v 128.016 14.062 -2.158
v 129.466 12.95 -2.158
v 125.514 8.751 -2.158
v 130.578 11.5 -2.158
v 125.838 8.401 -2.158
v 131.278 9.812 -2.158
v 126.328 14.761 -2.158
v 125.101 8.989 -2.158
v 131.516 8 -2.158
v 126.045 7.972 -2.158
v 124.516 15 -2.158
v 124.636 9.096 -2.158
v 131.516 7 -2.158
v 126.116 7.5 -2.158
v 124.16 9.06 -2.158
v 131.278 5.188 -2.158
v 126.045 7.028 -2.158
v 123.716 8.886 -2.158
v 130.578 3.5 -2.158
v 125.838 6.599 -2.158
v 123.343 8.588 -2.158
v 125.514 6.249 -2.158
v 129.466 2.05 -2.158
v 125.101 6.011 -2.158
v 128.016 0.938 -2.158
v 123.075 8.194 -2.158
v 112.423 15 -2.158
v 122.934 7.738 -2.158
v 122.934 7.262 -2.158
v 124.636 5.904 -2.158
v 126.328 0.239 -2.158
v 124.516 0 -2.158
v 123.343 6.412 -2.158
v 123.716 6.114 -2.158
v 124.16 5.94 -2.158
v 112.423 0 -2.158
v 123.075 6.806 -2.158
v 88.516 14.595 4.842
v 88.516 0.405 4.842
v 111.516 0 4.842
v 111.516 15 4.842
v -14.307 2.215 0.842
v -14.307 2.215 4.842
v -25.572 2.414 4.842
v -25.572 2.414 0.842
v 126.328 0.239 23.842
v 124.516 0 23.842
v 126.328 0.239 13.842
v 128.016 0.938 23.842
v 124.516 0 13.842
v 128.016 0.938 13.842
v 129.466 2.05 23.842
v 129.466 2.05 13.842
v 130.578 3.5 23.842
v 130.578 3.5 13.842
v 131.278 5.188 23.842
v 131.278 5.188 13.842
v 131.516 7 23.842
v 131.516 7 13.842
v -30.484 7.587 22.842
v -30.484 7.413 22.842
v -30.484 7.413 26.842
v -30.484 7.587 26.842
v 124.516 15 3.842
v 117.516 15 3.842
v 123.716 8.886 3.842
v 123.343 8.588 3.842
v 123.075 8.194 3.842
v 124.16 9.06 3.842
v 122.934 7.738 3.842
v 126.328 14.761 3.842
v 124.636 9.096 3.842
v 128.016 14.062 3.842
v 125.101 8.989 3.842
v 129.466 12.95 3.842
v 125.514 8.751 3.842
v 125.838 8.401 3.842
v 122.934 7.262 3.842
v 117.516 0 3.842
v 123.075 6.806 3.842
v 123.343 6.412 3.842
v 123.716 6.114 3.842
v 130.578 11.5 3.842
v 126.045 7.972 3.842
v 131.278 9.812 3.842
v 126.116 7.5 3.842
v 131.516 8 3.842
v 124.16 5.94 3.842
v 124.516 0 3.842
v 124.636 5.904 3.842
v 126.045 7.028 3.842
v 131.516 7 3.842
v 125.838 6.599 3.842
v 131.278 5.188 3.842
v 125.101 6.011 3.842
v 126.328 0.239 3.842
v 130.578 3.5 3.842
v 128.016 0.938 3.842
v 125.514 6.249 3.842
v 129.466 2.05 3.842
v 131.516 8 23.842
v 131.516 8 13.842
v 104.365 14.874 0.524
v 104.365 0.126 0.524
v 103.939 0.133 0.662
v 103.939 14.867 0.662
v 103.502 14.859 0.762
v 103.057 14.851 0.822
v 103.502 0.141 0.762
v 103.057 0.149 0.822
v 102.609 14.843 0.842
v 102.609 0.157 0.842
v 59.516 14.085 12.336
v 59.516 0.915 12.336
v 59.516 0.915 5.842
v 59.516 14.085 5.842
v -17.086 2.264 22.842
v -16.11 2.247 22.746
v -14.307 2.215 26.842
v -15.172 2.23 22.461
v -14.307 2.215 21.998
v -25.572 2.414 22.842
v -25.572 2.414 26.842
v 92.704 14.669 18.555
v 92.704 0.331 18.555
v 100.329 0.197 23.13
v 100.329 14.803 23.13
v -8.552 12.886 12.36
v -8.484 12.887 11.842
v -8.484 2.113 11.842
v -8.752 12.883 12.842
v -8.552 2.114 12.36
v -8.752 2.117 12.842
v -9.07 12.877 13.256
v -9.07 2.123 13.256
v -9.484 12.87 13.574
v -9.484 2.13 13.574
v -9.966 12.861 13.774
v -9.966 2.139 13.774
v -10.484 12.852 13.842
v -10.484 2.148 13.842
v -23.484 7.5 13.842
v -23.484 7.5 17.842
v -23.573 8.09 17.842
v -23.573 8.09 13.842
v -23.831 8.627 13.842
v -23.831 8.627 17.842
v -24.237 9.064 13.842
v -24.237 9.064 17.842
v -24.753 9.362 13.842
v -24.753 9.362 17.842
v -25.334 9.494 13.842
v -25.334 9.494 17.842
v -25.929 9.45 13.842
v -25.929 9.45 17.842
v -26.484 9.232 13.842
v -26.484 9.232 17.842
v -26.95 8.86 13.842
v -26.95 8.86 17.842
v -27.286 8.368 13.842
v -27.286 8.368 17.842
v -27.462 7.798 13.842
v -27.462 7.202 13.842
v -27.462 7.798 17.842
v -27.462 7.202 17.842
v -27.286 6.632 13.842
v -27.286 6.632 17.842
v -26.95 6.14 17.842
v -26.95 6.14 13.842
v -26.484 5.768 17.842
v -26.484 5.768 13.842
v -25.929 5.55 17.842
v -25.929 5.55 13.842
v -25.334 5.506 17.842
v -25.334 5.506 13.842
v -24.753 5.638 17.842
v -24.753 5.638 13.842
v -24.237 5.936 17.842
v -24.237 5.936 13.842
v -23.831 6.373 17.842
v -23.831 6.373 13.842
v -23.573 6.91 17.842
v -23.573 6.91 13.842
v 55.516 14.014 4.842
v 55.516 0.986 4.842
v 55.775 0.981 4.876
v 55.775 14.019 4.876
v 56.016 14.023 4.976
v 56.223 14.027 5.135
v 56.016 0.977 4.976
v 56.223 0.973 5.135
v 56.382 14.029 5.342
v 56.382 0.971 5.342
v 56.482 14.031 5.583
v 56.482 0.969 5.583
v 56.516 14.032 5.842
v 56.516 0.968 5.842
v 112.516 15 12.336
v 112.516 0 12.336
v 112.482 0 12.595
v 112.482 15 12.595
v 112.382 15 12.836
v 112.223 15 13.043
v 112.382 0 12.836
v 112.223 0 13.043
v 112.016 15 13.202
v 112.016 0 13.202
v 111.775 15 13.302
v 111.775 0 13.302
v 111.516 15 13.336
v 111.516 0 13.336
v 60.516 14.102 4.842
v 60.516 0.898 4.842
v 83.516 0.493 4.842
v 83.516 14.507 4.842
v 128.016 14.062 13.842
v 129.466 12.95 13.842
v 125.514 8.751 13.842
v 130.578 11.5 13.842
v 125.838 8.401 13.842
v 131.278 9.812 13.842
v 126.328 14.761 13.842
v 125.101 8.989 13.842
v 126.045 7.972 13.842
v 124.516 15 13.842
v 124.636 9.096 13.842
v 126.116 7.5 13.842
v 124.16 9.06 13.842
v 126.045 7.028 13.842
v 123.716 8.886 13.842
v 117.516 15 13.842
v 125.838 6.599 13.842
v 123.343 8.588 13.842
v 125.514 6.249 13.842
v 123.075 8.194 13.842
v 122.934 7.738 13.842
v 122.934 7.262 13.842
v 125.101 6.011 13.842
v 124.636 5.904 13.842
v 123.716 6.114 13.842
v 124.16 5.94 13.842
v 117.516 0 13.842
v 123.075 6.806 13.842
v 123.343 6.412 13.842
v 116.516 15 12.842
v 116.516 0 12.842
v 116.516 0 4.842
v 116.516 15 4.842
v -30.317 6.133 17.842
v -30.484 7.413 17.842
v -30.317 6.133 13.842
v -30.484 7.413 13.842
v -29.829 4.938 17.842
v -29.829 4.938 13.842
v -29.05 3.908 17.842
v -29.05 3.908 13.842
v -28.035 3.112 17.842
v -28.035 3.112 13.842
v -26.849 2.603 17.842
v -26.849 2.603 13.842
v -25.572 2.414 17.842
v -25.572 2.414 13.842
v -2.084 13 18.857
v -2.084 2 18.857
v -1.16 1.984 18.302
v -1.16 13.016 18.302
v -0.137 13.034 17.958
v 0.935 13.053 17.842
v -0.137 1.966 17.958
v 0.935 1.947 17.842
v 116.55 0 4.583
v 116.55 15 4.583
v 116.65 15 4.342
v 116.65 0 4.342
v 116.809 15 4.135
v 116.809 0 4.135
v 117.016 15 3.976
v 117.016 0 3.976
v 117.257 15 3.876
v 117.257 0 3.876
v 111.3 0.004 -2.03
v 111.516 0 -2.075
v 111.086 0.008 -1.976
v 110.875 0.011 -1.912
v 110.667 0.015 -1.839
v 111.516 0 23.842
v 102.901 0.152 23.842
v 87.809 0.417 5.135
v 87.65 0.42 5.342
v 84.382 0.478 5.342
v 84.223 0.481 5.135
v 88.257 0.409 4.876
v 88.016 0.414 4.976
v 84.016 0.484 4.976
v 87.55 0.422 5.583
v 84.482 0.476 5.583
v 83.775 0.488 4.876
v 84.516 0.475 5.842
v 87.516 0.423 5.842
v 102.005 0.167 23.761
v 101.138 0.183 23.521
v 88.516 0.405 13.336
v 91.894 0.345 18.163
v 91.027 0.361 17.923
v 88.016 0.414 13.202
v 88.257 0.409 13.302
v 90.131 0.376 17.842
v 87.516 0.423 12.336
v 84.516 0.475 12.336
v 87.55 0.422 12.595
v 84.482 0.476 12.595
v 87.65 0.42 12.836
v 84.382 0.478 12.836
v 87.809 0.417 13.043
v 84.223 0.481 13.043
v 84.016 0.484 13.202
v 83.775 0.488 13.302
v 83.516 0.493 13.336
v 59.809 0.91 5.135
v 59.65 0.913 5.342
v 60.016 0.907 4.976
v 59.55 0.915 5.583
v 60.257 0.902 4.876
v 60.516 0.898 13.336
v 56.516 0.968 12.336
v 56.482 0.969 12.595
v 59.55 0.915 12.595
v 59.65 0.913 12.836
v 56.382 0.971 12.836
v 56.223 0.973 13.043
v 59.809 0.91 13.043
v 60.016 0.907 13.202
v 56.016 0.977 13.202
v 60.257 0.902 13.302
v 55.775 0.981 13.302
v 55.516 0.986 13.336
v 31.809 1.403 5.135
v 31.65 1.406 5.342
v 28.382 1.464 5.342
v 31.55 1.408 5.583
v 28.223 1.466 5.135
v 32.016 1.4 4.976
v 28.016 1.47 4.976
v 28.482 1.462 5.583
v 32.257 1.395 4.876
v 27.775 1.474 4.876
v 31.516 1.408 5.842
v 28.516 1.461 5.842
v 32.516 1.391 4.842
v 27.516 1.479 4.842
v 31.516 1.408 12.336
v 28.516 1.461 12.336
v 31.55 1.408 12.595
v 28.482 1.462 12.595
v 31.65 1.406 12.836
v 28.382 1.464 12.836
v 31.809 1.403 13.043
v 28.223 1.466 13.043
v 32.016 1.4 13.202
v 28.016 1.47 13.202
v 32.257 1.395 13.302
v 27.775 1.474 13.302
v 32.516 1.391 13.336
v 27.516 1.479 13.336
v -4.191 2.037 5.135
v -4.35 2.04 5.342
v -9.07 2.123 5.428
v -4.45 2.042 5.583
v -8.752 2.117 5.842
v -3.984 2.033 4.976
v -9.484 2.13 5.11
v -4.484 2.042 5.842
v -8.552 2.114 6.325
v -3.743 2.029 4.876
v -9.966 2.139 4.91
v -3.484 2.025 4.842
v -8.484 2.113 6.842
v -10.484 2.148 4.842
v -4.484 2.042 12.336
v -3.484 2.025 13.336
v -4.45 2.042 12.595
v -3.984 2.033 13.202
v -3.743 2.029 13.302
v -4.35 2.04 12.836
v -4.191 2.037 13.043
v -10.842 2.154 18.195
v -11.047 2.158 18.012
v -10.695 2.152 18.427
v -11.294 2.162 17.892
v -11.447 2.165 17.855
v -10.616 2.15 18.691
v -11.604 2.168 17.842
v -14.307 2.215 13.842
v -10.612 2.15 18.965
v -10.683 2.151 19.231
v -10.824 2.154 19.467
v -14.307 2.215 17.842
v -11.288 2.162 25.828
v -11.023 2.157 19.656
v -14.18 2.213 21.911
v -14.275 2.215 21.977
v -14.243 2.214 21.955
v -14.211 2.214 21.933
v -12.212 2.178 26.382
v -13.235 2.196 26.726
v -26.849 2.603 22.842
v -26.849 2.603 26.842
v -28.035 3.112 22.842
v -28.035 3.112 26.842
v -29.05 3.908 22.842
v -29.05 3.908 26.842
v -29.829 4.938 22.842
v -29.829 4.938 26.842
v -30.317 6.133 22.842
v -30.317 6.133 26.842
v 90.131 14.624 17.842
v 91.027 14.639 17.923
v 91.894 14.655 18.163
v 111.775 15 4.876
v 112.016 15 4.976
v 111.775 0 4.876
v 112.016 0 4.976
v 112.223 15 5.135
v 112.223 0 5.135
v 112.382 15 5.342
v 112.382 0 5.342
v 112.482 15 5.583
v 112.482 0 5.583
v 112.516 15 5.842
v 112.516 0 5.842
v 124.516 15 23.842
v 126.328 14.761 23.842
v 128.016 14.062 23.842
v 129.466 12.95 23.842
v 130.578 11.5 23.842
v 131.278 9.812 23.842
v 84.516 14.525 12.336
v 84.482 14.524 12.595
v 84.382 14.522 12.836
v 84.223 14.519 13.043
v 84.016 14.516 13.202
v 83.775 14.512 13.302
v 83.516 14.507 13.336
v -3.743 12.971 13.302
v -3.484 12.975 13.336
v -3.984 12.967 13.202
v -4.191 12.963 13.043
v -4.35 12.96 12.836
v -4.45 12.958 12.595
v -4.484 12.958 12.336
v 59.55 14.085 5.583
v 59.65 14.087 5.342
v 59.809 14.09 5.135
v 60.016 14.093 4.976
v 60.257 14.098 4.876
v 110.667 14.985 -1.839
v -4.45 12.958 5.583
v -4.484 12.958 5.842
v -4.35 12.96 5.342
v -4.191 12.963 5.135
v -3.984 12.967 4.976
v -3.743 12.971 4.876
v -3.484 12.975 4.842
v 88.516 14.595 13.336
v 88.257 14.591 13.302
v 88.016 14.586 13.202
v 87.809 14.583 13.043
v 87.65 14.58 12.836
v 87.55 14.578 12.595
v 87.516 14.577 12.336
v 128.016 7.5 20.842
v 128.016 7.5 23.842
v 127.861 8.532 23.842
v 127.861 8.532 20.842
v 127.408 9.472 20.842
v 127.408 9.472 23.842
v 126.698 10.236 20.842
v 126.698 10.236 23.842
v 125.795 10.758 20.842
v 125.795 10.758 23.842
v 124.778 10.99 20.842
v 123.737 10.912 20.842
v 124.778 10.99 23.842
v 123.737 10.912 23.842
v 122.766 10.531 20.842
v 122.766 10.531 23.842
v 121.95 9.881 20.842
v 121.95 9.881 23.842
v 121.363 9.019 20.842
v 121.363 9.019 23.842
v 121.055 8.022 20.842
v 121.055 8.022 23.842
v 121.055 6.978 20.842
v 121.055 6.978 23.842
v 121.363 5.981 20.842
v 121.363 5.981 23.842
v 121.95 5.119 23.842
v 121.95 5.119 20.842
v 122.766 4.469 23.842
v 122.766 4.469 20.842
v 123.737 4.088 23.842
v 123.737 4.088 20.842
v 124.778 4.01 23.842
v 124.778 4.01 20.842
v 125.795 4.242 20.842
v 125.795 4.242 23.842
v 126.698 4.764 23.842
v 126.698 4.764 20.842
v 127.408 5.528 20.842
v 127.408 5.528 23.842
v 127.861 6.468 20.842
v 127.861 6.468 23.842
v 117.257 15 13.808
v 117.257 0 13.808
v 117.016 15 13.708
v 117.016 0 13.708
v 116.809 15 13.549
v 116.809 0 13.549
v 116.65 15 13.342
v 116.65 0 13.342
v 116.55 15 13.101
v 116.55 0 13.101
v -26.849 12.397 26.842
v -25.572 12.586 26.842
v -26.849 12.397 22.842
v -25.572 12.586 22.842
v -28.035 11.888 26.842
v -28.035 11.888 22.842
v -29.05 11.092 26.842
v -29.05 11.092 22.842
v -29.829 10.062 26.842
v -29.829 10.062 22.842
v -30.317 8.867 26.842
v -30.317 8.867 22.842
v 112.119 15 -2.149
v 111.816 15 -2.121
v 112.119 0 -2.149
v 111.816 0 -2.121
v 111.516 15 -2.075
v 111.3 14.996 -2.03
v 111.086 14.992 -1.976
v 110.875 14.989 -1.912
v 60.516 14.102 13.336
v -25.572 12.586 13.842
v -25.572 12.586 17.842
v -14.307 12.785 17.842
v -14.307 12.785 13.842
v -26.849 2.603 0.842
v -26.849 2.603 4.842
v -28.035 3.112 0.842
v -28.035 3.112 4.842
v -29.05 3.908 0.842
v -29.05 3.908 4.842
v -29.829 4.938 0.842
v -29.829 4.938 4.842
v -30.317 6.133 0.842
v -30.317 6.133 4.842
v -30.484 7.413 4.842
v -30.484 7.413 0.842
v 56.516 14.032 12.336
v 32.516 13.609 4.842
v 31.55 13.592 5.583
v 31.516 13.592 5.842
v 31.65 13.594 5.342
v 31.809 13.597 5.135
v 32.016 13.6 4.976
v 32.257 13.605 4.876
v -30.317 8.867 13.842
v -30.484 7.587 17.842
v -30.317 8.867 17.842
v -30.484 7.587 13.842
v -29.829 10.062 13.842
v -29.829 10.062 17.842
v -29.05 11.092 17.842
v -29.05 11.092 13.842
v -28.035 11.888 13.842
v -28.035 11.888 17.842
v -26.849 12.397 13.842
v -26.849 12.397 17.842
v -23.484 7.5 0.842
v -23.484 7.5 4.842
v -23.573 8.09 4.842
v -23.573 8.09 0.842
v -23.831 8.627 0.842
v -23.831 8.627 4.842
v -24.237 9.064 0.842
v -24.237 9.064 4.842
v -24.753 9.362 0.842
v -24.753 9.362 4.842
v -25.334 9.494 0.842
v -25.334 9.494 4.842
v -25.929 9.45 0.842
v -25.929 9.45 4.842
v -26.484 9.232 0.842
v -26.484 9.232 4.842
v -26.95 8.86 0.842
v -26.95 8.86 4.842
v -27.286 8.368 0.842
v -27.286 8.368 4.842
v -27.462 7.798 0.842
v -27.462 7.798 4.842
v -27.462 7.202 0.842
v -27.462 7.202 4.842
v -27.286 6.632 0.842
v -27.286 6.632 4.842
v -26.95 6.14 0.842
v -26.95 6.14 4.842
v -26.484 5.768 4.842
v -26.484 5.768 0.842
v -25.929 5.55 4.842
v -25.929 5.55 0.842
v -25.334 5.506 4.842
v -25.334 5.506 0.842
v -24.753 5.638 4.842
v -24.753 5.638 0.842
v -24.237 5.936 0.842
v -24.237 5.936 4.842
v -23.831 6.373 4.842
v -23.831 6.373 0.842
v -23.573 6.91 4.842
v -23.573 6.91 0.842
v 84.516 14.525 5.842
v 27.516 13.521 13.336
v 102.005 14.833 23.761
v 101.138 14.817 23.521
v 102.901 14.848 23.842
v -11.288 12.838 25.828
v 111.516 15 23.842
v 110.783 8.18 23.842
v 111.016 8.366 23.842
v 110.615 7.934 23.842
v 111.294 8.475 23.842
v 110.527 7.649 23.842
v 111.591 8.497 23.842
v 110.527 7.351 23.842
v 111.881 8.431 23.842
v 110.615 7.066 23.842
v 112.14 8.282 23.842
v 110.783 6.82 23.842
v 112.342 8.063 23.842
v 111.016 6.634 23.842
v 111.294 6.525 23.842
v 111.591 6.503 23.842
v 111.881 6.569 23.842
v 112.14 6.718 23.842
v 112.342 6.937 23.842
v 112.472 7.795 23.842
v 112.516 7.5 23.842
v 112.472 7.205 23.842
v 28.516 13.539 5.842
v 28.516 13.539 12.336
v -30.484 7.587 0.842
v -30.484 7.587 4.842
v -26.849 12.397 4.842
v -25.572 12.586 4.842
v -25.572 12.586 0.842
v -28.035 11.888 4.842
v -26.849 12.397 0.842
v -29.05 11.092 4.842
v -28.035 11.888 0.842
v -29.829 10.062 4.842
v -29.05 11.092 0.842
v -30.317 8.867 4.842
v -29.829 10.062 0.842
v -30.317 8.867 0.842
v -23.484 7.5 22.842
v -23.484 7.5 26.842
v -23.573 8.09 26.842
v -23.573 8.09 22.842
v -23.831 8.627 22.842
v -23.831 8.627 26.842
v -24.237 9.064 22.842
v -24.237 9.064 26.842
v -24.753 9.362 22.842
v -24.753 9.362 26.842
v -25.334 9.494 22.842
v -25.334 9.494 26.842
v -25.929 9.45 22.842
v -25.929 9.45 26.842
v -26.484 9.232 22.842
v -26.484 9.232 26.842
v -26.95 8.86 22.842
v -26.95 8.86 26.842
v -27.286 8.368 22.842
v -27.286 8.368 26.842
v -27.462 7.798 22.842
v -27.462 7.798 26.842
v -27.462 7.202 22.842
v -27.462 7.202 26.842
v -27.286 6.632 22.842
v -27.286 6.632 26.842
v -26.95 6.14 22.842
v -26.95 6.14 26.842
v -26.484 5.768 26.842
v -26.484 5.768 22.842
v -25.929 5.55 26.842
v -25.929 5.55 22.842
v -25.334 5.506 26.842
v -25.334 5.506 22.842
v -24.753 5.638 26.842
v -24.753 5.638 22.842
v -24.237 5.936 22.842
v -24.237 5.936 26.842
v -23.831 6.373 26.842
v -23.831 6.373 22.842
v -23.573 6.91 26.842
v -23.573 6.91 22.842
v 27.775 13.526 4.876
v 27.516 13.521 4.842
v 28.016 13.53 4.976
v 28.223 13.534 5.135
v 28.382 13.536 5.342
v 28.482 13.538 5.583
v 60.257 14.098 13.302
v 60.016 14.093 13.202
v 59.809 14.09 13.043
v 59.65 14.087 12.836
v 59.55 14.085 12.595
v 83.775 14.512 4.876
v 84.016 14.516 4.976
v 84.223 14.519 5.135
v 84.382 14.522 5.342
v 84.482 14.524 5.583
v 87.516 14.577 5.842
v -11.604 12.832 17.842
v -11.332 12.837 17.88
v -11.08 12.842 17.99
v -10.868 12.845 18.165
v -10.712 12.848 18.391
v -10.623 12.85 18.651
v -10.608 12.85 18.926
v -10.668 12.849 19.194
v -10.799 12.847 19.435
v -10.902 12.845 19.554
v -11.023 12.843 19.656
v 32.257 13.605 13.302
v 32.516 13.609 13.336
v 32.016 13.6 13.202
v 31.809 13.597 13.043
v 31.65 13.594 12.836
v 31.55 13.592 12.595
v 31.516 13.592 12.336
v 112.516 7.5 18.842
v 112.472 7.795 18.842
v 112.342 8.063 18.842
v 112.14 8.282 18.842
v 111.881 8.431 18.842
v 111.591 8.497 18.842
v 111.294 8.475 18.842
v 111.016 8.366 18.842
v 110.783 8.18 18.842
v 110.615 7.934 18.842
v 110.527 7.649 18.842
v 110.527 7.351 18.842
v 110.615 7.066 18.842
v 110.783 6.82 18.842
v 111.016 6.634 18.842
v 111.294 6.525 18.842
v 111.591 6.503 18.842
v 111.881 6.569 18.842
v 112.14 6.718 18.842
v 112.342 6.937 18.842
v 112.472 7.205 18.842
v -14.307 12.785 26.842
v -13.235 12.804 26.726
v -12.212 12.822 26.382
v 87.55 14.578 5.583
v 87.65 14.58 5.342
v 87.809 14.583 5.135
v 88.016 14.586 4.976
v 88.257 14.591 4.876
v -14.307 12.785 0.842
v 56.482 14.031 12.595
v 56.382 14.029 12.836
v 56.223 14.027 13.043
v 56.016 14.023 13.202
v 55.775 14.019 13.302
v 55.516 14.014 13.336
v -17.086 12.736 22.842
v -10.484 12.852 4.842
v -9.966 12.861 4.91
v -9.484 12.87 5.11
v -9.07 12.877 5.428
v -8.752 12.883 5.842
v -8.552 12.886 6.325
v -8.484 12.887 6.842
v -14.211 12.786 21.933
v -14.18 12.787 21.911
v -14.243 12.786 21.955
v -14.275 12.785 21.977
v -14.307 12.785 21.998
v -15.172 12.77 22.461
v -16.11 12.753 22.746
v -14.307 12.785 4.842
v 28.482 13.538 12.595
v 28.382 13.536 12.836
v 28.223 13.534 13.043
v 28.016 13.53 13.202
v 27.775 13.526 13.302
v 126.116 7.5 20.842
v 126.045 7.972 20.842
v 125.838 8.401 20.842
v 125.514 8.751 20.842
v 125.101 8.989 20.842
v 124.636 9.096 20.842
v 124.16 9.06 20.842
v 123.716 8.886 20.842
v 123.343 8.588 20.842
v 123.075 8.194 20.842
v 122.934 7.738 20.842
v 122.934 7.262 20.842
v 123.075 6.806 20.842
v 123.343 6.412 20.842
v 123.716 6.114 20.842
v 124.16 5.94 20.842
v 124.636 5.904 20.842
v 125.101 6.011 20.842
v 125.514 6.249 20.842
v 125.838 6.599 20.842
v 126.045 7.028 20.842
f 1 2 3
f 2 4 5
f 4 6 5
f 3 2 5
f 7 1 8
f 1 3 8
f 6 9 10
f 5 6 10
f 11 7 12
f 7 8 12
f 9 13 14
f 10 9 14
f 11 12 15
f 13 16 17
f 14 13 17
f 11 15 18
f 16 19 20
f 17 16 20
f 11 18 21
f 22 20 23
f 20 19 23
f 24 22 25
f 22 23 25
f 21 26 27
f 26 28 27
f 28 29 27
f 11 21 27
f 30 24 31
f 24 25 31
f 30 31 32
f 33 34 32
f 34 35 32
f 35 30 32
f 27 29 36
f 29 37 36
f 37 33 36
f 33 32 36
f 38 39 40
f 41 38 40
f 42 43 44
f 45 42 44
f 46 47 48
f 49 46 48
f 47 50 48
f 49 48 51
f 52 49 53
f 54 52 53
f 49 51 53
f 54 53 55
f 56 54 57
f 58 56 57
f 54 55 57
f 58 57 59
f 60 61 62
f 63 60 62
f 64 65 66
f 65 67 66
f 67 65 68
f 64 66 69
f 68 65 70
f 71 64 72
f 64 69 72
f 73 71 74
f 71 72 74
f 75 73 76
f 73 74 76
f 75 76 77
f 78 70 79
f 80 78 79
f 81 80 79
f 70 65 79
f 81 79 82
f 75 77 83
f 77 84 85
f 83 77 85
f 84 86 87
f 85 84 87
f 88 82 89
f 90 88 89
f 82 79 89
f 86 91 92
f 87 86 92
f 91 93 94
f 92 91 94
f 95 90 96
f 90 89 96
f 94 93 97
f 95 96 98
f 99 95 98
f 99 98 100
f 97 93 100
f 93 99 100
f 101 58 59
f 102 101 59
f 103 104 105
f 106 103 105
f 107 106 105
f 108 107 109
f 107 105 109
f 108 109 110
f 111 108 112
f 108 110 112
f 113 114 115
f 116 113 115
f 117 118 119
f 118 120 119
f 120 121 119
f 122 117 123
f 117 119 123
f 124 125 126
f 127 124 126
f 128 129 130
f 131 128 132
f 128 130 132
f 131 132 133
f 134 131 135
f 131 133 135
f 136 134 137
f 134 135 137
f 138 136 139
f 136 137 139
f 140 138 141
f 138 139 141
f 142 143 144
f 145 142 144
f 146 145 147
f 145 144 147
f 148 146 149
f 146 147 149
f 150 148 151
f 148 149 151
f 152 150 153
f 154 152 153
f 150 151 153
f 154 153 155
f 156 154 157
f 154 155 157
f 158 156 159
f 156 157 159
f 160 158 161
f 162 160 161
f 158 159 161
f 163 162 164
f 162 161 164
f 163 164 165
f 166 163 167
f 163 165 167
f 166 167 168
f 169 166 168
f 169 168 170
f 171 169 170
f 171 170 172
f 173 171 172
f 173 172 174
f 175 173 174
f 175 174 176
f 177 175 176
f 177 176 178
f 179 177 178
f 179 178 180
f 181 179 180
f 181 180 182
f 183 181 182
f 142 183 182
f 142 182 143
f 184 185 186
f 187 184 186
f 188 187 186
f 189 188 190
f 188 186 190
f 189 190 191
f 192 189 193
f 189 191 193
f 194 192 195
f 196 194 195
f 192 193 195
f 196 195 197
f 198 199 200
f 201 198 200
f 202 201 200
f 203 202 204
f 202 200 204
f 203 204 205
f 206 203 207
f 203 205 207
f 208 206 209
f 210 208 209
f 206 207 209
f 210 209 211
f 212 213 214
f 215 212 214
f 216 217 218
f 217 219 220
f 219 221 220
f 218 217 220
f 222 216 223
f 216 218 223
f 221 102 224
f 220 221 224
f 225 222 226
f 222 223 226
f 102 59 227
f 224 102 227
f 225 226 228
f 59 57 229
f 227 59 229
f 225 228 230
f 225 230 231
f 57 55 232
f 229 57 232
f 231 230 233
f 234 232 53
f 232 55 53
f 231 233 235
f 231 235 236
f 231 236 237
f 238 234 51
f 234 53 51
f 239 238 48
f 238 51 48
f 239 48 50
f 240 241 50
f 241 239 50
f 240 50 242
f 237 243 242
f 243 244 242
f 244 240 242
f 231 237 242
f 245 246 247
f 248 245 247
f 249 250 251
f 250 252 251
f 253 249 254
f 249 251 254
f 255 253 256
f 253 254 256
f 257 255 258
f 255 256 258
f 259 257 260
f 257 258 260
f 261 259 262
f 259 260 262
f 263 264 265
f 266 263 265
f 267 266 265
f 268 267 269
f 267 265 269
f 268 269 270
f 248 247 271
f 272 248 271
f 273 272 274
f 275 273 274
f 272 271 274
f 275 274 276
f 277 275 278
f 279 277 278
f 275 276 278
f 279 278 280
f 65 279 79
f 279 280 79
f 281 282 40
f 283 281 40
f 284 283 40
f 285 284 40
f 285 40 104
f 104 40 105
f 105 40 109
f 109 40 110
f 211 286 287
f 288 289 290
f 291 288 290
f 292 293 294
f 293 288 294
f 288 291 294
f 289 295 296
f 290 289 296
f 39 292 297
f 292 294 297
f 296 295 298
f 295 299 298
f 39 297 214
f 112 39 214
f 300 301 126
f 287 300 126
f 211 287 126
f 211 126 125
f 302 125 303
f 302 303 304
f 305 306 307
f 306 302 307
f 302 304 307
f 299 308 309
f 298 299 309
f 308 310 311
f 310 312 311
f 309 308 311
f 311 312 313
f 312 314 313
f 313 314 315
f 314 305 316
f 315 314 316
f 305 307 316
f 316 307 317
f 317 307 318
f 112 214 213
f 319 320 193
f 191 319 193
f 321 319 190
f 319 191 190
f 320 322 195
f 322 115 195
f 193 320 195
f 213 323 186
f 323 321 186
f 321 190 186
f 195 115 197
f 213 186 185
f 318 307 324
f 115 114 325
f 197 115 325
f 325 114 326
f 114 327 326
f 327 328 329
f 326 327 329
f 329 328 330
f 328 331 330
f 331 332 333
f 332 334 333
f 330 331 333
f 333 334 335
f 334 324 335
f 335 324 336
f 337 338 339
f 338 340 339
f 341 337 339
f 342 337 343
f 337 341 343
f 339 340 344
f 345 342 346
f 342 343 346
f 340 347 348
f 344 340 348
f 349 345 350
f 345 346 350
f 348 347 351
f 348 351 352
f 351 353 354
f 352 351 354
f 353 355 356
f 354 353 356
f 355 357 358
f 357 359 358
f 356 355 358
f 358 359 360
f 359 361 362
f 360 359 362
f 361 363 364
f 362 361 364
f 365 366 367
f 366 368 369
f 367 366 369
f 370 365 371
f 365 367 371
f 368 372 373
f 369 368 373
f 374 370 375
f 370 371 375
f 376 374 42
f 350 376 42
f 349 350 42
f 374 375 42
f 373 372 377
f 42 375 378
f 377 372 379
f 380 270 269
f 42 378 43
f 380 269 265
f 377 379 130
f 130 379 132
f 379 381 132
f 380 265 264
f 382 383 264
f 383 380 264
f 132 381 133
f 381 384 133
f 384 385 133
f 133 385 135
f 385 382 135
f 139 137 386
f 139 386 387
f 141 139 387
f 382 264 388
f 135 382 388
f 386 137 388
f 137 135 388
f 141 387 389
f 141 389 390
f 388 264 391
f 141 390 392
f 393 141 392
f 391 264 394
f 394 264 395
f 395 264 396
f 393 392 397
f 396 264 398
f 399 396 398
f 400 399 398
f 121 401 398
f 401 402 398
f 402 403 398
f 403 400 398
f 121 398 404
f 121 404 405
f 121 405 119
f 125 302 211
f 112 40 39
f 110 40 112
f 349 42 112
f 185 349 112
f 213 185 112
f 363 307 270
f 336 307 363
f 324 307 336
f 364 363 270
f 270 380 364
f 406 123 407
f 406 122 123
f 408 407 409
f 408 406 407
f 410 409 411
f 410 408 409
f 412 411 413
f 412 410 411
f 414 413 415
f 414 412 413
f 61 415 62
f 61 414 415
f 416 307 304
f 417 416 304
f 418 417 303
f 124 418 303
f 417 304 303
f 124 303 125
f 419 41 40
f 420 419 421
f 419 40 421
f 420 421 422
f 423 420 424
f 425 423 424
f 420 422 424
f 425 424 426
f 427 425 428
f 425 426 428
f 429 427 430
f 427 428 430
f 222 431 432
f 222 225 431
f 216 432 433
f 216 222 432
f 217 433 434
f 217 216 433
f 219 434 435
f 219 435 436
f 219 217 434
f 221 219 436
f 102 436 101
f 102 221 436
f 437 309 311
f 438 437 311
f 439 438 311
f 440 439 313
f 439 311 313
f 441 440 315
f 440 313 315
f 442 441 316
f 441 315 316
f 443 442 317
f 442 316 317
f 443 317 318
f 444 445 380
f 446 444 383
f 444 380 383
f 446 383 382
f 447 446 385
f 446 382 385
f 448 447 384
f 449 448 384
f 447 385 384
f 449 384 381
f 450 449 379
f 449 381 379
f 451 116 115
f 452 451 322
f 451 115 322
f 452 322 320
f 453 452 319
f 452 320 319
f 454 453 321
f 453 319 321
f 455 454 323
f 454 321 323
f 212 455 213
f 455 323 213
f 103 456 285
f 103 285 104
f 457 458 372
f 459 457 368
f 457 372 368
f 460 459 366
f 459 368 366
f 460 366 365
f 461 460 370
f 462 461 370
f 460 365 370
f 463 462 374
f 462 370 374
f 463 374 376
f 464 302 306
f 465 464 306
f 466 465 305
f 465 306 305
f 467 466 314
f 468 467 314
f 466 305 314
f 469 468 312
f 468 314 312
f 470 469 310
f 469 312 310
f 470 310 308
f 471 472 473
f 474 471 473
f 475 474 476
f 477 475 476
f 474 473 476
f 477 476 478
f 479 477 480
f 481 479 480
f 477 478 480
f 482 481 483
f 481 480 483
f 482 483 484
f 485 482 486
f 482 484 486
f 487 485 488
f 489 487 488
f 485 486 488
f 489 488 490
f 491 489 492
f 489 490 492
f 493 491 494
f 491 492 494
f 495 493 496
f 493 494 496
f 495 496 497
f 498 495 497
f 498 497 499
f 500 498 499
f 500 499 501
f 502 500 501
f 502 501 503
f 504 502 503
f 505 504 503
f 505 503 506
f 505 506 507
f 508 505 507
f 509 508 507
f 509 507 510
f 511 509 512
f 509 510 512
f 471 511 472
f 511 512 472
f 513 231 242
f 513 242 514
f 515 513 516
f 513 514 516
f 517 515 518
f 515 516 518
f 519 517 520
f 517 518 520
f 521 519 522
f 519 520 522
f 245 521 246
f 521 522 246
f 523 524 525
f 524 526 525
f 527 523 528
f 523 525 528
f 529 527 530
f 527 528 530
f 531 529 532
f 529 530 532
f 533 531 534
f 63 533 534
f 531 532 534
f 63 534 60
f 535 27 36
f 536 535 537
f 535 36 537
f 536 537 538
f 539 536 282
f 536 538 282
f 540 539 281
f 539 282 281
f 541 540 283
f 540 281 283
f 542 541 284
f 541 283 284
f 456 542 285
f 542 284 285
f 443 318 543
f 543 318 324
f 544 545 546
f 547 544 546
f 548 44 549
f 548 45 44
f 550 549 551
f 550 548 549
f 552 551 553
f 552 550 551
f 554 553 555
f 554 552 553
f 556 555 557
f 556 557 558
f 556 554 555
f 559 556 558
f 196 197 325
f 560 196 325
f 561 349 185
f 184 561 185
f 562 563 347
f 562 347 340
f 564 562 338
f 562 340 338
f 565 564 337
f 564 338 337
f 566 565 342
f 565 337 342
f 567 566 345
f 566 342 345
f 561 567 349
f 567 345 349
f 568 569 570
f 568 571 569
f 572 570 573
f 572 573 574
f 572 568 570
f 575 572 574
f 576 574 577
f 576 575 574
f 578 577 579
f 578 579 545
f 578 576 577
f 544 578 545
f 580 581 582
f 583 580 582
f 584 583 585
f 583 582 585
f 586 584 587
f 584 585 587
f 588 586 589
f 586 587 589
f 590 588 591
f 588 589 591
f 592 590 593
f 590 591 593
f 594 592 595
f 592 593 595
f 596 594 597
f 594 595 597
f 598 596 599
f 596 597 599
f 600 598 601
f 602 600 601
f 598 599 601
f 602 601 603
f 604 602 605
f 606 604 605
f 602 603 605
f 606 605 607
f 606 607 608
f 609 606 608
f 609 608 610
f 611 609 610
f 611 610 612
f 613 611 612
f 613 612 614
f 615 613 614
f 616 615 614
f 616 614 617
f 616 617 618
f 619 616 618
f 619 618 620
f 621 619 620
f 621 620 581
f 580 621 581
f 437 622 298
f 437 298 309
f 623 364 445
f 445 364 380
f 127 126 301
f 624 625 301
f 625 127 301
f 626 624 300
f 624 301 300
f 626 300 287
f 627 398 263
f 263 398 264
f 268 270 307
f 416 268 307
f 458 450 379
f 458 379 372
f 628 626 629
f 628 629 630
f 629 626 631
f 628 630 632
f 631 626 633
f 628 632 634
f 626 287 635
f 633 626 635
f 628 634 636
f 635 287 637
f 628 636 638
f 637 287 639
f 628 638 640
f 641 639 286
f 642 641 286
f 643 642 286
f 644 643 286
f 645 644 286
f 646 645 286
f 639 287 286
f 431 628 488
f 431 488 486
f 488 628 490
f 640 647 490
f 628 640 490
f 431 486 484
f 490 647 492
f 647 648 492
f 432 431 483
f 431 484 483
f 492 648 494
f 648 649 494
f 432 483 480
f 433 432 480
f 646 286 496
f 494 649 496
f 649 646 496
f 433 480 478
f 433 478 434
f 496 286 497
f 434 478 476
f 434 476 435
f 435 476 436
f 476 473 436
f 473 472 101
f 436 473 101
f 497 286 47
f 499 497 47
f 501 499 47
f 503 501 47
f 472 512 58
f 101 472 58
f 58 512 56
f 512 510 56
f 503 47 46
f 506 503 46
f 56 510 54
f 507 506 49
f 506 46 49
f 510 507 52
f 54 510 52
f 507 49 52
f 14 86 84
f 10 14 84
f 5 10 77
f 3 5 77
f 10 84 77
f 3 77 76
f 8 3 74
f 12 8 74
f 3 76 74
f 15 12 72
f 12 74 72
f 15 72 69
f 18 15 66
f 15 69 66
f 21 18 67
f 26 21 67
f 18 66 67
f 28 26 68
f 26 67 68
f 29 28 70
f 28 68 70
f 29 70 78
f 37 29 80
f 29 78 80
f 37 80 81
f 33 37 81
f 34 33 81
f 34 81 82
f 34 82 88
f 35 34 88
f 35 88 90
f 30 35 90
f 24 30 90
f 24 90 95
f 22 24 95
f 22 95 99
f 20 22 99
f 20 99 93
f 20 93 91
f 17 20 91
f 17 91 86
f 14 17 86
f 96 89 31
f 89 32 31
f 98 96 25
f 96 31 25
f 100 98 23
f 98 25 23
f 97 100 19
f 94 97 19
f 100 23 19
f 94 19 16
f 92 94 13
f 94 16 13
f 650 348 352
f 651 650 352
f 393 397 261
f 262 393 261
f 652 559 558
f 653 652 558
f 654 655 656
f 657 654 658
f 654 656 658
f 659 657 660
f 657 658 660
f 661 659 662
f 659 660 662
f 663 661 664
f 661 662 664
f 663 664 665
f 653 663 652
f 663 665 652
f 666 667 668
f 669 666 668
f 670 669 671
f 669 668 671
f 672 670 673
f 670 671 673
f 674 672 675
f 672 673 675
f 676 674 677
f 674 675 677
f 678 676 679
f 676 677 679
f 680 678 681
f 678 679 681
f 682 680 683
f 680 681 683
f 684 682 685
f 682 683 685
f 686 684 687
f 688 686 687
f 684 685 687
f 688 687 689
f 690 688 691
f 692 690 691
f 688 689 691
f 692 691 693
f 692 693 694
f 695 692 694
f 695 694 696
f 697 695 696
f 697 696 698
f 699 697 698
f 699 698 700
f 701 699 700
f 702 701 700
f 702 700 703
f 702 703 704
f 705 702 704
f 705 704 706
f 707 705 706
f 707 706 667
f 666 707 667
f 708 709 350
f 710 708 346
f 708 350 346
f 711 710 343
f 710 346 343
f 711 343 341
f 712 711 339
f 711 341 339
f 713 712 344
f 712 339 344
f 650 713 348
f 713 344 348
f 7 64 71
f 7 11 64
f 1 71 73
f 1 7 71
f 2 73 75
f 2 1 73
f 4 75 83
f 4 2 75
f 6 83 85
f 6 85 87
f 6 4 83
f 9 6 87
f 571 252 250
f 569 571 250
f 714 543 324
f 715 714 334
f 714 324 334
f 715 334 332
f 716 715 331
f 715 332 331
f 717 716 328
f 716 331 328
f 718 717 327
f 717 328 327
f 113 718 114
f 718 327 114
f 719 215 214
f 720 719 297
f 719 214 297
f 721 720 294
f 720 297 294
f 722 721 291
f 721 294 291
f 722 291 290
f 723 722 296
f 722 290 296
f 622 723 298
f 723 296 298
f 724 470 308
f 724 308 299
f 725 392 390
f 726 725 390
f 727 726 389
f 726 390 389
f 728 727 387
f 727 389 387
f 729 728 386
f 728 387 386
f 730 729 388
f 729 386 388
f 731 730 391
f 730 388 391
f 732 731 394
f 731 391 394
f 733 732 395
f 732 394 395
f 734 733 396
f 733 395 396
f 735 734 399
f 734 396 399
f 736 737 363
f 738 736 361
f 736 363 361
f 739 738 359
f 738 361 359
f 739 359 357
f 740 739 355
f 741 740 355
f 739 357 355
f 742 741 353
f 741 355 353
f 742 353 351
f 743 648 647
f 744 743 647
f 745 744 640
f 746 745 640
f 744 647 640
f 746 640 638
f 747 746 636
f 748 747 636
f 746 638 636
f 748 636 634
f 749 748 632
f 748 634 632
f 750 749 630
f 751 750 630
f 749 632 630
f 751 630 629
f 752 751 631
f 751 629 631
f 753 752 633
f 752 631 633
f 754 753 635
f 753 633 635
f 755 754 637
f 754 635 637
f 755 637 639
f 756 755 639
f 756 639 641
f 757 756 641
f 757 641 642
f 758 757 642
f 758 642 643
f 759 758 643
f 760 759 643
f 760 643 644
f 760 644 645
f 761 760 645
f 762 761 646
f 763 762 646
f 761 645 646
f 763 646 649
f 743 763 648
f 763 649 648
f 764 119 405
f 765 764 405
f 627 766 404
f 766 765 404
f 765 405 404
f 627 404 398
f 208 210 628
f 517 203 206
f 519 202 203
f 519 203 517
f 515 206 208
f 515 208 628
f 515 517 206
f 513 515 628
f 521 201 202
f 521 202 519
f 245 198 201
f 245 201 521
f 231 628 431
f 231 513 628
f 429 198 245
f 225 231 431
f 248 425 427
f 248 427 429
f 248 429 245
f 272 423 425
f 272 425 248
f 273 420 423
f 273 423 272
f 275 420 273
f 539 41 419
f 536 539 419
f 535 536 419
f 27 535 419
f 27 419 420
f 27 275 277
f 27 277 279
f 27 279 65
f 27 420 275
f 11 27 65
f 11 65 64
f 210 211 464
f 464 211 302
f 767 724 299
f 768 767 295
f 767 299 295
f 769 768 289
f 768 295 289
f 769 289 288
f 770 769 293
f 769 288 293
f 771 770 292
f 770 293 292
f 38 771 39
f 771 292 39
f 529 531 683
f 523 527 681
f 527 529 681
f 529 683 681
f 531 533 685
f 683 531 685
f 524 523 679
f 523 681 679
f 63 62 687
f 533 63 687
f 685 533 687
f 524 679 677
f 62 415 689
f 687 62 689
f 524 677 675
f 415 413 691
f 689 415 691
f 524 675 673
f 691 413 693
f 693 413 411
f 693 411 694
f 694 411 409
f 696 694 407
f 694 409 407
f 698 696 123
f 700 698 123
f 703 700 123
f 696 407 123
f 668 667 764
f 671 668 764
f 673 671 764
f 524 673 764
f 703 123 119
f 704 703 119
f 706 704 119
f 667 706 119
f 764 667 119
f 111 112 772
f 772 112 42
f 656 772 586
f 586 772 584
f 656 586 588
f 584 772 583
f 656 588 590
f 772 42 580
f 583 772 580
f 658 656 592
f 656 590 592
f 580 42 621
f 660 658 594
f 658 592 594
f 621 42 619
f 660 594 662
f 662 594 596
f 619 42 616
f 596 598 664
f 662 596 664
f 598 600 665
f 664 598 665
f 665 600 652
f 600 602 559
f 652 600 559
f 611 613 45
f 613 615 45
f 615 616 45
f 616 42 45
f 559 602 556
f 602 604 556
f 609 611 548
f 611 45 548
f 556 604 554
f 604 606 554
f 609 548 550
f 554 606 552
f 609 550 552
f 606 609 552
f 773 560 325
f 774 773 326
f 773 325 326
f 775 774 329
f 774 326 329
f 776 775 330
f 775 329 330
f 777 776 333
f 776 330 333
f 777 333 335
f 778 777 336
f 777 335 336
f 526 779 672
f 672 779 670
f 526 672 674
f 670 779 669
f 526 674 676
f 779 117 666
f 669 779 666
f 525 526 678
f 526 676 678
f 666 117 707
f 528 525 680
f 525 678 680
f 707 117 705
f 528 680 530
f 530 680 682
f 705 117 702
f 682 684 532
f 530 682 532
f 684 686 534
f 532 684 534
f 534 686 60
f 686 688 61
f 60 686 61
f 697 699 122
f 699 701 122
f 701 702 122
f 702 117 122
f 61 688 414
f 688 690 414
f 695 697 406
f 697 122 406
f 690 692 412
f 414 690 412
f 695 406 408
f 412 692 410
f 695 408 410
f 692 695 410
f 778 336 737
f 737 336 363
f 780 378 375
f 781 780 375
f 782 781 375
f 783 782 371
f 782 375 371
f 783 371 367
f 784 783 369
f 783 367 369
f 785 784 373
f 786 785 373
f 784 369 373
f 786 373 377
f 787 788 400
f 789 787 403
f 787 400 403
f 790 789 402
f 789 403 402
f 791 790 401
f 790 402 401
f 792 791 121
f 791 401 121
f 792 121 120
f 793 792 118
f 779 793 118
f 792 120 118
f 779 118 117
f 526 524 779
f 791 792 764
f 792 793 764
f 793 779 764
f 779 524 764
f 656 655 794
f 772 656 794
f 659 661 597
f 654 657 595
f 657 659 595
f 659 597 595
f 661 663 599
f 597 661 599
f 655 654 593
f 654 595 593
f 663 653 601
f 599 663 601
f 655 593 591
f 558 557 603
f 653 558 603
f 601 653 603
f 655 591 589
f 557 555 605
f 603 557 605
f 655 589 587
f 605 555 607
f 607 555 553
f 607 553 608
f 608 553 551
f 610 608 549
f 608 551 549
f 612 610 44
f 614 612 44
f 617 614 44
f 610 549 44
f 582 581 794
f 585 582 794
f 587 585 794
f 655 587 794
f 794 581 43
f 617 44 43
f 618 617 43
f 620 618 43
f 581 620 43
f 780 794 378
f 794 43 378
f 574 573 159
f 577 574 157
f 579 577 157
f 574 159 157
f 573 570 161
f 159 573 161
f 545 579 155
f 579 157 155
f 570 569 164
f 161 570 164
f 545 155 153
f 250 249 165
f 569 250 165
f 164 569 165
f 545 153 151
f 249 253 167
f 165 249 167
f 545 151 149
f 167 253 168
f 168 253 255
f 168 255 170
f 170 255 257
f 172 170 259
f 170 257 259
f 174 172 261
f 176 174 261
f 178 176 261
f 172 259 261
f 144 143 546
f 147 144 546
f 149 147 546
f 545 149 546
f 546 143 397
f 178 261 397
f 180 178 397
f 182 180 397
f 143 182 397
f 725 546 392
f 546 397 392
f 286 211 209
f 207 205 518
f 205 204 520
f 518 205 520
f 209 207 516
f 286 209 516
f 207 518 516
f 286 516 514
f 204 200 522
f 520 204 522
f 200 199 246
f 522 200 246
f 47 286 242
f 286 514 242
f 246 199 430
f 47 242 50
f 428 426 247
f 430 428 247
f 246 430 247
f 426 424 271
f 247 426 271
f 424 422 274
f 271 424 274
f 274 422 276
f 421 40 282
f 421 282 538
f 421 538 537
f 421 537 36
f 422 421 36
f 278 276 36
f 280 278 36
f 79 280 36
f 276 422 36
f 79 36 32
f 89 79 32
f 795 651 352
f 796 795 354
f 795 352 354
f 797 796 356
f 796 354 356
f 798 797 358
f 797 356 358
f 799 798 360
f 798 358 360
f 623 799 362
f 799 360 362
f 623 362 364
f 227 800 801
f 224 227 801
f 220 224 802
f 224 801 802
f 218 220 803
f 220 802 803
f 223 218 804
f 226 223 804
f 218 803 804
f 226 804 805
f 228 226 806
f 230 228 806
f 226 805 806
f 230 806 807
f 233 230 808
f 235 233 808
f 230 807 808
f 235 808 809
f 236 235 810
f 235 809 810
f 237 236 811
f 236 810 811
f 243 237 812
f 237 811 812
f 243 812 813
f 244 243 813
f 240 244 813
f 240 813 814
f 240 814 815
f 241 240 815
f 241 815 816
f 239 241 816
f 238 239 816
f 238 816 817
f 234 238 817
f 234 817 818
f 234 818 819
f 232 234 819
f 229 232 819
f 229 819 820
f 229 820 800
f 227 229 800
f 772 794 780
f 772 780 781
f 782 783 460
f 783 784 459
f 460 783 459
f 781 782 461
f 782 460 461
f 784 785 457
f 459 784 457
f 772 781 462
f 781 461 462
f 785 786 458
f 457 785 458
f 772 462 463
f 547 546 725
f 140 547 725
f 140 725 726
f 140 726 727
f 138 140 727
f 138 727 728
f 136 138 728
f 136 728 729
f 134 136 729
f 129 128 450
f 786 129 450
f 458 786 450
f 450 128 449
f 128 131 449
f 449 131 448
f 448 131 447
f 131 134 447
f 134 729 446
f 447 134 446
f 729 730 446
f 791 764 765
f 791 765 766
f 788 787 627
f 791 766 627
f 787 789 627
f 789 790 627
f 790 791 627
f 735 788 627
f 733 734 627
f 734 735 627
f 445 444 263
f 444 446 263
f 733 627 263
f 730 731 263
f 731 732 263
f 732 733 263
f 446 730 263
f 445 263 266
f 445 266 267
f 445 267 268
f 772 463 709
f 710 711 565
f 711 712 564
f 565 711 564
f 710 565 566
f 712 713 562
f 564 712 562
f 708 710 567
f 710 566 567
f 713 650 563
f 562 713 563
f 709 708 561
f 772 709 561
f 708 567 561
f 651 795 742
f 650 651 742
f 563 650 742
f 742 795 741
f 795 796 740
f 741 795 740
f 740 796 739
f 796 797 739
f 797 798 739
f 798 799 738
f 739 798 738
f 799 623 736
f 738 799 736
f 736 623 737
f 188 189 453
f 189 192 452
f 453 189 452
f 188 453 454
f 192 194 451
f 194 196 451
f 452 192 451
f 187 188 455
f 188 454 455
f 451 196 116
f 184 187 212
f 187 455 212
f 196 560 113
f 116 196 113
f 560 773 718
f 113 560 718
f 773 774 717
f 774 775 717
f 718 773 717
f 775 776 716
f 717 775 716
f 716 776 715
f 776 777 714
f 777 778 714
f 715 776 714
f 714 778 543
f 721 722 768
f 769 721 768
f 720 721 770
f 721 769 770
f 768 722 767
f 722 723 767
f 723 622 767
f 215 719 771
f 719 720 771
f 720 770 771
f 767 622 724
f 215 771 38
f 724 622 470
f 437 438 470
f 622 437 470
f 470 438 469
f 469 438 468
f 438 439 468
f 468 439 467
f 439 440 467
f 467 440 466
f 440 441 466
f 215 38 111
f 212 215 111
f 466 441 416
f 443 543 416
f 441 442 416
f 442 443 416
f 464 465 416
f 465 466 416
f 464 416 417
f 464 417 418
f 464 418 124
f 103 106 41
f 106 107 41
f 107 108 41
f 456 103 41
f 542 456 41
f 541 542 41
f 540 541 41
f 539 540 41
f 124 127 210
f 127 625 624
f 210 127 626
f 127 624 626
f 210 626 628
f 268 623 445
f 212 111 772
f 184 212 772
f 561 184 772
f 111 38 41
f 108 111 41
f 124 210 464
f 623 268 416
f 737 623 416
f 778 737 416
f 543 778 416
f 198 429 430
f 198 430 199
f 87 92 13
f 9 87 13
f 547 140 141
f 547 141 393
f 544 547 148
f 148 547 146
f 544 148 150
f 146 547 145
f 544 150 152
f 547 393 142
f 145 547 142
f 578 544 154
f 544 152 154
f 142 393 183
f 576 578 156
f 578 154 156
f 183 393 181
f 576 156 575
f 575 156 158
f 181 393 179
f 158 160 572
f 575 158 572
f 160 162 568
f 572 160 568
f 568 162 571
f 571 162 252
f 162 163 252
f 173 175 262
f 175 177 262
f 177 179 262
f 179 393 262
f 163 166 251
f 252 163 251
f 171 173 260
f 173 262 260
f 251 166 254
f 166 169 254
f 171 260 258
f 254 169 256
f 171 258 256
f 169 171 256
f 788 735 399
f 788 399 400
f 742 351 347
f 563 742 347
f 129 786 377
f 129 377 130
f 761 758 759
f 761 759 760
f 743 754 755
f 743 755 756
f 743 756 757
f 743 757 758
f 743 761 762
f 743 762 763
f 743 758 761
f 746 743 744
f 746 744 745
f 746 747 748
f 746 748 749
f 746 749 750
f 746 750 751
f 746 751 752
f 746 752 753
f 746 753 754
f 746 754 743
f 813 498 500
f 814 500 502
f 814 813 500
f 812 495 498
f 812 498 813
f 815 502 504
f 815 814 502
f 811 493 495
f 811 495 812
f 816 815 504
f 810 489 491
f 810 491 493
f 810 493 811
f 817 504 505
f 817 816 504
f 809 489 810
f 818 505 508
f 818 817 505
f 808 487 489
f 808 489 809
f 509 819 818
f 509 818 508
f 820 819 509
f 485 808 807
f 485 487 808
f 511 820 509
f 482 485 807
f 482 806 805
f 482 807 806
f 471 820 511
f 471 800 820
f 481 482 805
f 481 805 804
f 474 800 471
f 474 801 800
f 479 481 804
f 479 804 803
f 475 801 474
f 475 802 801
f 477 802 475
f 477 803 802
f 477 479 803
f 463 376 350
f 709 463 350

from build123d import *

# Parameters (mm, degrees)
BOSS_EXTRUDE1_DEPTH = 15
CUT_EXTRUDE1_DEPTH  = 136.508273532
SKETCH3_R           = 2
CUT_EXTRUDE2_DEPTH  = 136.508273532
SKETCH4_R           = 1.6
CUT_EXTRUDE3_DEPTH  = 135.898080771
FILLET1_R           = 5
FILLET2_R           = 7
SKETCH6_R           = 3.5
CUT_EXTRUDE4_DEPTH  = 3
SKETCH7_R           = 1
CUT_EXTRUDE5_DEPTH  = 5


with BuildPart() as part:
    # Sketch1 → Boss-Extrude1 (new body)
    with BuildSketch(Plane(origin=(0, 0, 0), x_dir=(1, 0, 0), z_dir=(0, 1, 0))):
        with BuildLine():
            Line((-30.483870968, -13.842203604), (-30.483870968, -17.842203604))
            Line((-30.483870968, -17.842203604), (-15.483870968, -17.842203604))
            Line((-15.483870968, -17.842203604), (-11.604336021, -17.842203604))
            ThreePointArc((-11.604336021, -17.842203604), (-10.652040513, -18.537026173), (-11.023097827, -19.655937075))
            Line((-11.023097827, -19.655937075), (-14.180005266, -21.91087096))
            ThreePointArc((-14.180005266, -21.91087096), (-15.56030908, -22.603681147), (-17.086196235, -22.842203604))
            Line((-17.086196235, -22.842203604), (-30.483870968, -22.842203604))
            Line((-30.483870968, -22.842203604), (-30.483870968, -26.842203604))
            Line((-30.483870968, -26.842203604), (-14.306659767, -26.842203604))
            ThreePointArc((-14.306659767, -26.842203604), (-12.714208629, -26.581834325), (-11.287607633, -25.827843353))
            Line((-11.287607633, -25.827843353), (-2.084385084, -18.856563855))
            ThreePointArc((-2.084385084, -18.856563855), (-0.657784088, -18.102572883), (0.93466705, -17.842203604))
            Line((0.93466705, -17.842203604), (90.131209208, -17.842203604))
            ThreePointArc((90.131209208, -17.842203604), (91.465877117, -18.023628963), (92.703687985, -18.554738975))
            Line((92.703687985, -18.554738975), (100.32857008, -23.129668233))
            ThreePointArc((100.32857008, -23.129668233), (101.566380948, -23.660778245), (102.901048857, -23.842203604))
            Line((102.901048857, -23.842203604), (131.516129032, -23.842203604))
            Line((131.516129032, -23.842203604), (131.516129032, -13.842203604))
            Line((131.516129032, -13.842203604), (117.516129032, -13.842203604))
            ThreePointArc((117.516129032, -13.842203604), (116.809022251, -13.549310385), (116.516129032, -12.842203604))
            Line((116.516129032, -12.842203604), (116.516129032, -4.842203604))
            ThreePointArc((116.516129032, -4.842203604), (116.809022251, -4.135096823), (117.516129032, -3.842203604))
            Line((117.516129032, -3.842203604), (131.516129032, -3.842203604))
            Line((131.516129032, -3.842203604), (131.516129032, -0.842203604))
            Line((131.516129032, -0.842203604), (131.516129032, 2.157796396))
            Line((131.516129032, 2.157796396), (112.422801941, 2.157796396))
            ThreePointArc((112.422801941, 2.157796396), (111.530677914, 2.077564147), (110.667184733, 1.839442284))
            Line((110.667184733, 1.839442284), (104.365073331, -0.523849492))
            ThreePointArc((104.365073331, -0.523849492), (103.501580151, -0.761971355), (102.609456123, -0.842203604))
            Line((102.609456123, -0.842203604), (-30.483870968, -0.842203604))
            Line((-30.483870968, -0.842203604), (-30.483870968, -4.842203604))
            Line((-30.483870968, -4.842203604), (-10.483870968, -4.842203604))
            ThreePointArc((-10.483870968, -4.842203604), (-9.069657405, -5.427990042), (-8.483870968, -6.842203604))
            Line((-8.483870968, -6.842203604), (-8.483870968, -11.842203604))
            ThreePointArc((-8.483870968, -11.842203604), (-9.069657405, -13.256417166), (-10.483870968, -13.842203604))
            Line((-10.483870968, -13.842203604), (-30.483870968, -13.842203604))
        make_face()
        with BuildLine():
            Line((-3.483870968, -4.842203604), (27.516129032, -4.842203604))
            ThreePointArc((27.516129032, -4.842203604), (28.223235813, -5.135096823), (28.516129032, -5.842203604))
            Line((28.516129032, -5.842203604), (28.516129032, -12.336203873))
            ThreePointArc((28.516129032, -12.336203873), (28.223235813, -13.043310655), (27.516129032, -13.336203873))
            Line((27.516129032, -13.336203873), (-3.483870968, -13.336203873))
            ThreePointArc((-3.483870968, -13.336203873), (-4.190977749, -13.043310655), (-4.483870968, -12.336203873))
            Line((-4.483870968, -12.336203873), (-4.483870968, -5.842203604))
            ThreePointArc((-4.483870968, -5.842203604), (-4.190977749, -5.135096823), (-3.483870968, -4.842203604))
        make_face(mode=Mode.SUBTRACT)
        with BuildLine():
            Line((32.516129032, -4.842203604), (55.516129032, -4.842203604))
            ThreePointArc((55.516129032, -4.842203604), (56.223235813, -5.135096823), (56.516129032, -5.842203604))
            Line((56.516129032, -5.842203604), (56.516129032, -12.336203873))
            ThreePointArc((56.516129032, -12.336203873), (56.223235813, -13.043310655), (55.516129032, -13.336203873))
            Line((55.516129032, -13.336203873), (32.516129032, -13.336203873))
            ThreePointArc((32.516129032, -13.336203873), (31.809022251, -13.043310655), (31.516129032, -12.336203873))
            Line((31.516129032, -12.336203873), (31.516129032, -5.842203604))
            ThreePointArc((31.516129032, -5.842203604), (31.809022251, -5.135096823), (32.516129032, -4.842203604))
        make_face(mode=Mode.SUBTRACT)
        with BuildLine():
            Line((60.516129032, -4.842203604), (83.516129032, -4.842203604))
            ThreePointArc((83.516129032, -4.842203604), (84.223235813, -5.135096823), (84.516129032, -5.842203604))
            Line((84.516129032, -5.842203604), (84.516129032, -12.336203873))
            ThreePointArc((84.516129032, -12.336203873), (84.223235813, -13.043310655), (83.516129032, -13.336203873))
            Line((83.516129032, -13.336203873), (60.516129032, -13.336203873))
            ThreePointArc((60.516129032, -13.336203873), (59.809022251, -13.043310655), (59.516129032, -12.336203873))
            Line((59.516129032, -12.336203873), (59.516129032, -5.842203604))
            ThreePointArc((59.516129032, -5.842203604), (59.809022251, -5.135096823), (60.516129032, -4.842203604))
        make_face(mode=Mode.SUBTRACT)
        with BuildLine():
            Line((88.516129032, -4.842203604), (111.516129032, -4.842203604))
            ThreePointArc((111.516129032, -4.842203604), (112.223235813, -5.135096823), (112.516129032, -5.842203604))
            Line((112.516129032, -5.842203604), (112.516129032, -12.336203873))
            ThreePointArc((112.516129032, -12.336203873), (112.223235813, -13.043310655), (111.516129032, -13.336203873))
            Line((111.516129032, -13.336203873), (88.516129032, -13.336203873))
            ThreePointArc((88.516129032, -13.336203873), (87.809022251, -13.043310655), (87.516129032, -12.336203873))
            Line((87.516129032, -12.336203873), (87.516129032, -5.842203604))
            ThreePointArc((87.516129032, -5.842203604), (87.809022251, -5.135096823), (88.516129032, -4.842203604))
        make_face(mode=Mode.SUBTRACT)
    extrude(amount=BOSS_EXTRUDE1_DEPTH)

    # Sketch2 → Cut-Extrude1 (cut, through all)
    with BuildSketch(Plane.XY.offset(26.842203604)):
        Polygon((-14.306659767, 2.215189944), (-30.483870968, 2.5), (-30.483870968, 0), (-14.306659767, 0), align=None)
        Polygon((111.516129032, 0), (-14.306659767, 2.215189944), (-14.306659767, 0), align=None)
        Polygon((-30.483870968, 15), (-30.483870968, 12.5), (-14.306659767, 12.784810056), (-14.306659767, 15), align=None)
        Polygon((-14.306659767, 15), (-14.306659767, 12.784810056), (111.516129032, 15), align=None)
    extrude(amount=-CUT_EXTRUDE1_DEPTH, mode=Mode.SUBTRACT)

    # Sketch3 → Cut-Extrude2 (cut, through all)
    with BuildSketch(Plane.XY.offset(26.842203604)):
        with Locations((-25.483870968, 7.5)):
            Circle(SKETCH3_R)
    extrude(amount=-CUT_EXTRUDE2_DEPTH, mode=Mode.SUBTRACT)

    # Sketch4 → Cut-Extrude3 (cut, through all)
    with BuildSketch(Plane.XY.offset(23.842203604)):
        with Locations((124.516129032, 7.5)):
            Circle(SKETCH4_R)
    extrude(amount=-CUT_EXTRUDE3_DEPTH, mode=Mode.SUBTRACT)

    # Fillet1
    fillet1_edges = [part.edges().sort_by_distance(p)[0] for p in [
        (-30.483870968, 2.5, 2.842203604),
        (-30.483870968, 2.5, 15.842203604),
        (-30.483870968, 2.5, 24.842203604),
        (-30.483870968, 12.5, 2.842203604),
        (-30.483870968, 12.5, 15.842203604),
        (-30.483870968, 12.5, 24.842203604),
    ]]
    fillet(fillet1_edges, radius=FILLET1_R)

    # Fillet2
    fillet2_edges = [part.edges().sort_by_distance(p)[0] for p in [
        (131.516129032, 0, 0.842203604),
        (131.516129032, 0, 18.842203604),
        (131.516129032, 15, 18.842203604),
        (131.516129032, 15, 0.842203604),
    ]]
    fillet(fillet2_edges, radius=FILLET2_R)

    # Sketch6 → Cut-Extrude4 (cut)
    with BuildSketch(Plane.XY.offset(23.842203604)):
        with Locations((124.516129032, 7.5)):
            Circle(SKETCH6_R)
    extrude(amount=-CUT_EXTRUDE4_DEPTH, mode=Mode.SUBTRACT)

    # Sketch7 → Cut-Extrude5 (cut)
    with BuildSketch(Plane.XY.offset(23.842203604)):
        with Locations((111.516129032, 7.5)):
            Circle(SKETCH7_R)
    extrude(amount=-CUT_EXTRUDE5_DEPTH, mode=Mode.SUBTRACT)


solid = part.part
